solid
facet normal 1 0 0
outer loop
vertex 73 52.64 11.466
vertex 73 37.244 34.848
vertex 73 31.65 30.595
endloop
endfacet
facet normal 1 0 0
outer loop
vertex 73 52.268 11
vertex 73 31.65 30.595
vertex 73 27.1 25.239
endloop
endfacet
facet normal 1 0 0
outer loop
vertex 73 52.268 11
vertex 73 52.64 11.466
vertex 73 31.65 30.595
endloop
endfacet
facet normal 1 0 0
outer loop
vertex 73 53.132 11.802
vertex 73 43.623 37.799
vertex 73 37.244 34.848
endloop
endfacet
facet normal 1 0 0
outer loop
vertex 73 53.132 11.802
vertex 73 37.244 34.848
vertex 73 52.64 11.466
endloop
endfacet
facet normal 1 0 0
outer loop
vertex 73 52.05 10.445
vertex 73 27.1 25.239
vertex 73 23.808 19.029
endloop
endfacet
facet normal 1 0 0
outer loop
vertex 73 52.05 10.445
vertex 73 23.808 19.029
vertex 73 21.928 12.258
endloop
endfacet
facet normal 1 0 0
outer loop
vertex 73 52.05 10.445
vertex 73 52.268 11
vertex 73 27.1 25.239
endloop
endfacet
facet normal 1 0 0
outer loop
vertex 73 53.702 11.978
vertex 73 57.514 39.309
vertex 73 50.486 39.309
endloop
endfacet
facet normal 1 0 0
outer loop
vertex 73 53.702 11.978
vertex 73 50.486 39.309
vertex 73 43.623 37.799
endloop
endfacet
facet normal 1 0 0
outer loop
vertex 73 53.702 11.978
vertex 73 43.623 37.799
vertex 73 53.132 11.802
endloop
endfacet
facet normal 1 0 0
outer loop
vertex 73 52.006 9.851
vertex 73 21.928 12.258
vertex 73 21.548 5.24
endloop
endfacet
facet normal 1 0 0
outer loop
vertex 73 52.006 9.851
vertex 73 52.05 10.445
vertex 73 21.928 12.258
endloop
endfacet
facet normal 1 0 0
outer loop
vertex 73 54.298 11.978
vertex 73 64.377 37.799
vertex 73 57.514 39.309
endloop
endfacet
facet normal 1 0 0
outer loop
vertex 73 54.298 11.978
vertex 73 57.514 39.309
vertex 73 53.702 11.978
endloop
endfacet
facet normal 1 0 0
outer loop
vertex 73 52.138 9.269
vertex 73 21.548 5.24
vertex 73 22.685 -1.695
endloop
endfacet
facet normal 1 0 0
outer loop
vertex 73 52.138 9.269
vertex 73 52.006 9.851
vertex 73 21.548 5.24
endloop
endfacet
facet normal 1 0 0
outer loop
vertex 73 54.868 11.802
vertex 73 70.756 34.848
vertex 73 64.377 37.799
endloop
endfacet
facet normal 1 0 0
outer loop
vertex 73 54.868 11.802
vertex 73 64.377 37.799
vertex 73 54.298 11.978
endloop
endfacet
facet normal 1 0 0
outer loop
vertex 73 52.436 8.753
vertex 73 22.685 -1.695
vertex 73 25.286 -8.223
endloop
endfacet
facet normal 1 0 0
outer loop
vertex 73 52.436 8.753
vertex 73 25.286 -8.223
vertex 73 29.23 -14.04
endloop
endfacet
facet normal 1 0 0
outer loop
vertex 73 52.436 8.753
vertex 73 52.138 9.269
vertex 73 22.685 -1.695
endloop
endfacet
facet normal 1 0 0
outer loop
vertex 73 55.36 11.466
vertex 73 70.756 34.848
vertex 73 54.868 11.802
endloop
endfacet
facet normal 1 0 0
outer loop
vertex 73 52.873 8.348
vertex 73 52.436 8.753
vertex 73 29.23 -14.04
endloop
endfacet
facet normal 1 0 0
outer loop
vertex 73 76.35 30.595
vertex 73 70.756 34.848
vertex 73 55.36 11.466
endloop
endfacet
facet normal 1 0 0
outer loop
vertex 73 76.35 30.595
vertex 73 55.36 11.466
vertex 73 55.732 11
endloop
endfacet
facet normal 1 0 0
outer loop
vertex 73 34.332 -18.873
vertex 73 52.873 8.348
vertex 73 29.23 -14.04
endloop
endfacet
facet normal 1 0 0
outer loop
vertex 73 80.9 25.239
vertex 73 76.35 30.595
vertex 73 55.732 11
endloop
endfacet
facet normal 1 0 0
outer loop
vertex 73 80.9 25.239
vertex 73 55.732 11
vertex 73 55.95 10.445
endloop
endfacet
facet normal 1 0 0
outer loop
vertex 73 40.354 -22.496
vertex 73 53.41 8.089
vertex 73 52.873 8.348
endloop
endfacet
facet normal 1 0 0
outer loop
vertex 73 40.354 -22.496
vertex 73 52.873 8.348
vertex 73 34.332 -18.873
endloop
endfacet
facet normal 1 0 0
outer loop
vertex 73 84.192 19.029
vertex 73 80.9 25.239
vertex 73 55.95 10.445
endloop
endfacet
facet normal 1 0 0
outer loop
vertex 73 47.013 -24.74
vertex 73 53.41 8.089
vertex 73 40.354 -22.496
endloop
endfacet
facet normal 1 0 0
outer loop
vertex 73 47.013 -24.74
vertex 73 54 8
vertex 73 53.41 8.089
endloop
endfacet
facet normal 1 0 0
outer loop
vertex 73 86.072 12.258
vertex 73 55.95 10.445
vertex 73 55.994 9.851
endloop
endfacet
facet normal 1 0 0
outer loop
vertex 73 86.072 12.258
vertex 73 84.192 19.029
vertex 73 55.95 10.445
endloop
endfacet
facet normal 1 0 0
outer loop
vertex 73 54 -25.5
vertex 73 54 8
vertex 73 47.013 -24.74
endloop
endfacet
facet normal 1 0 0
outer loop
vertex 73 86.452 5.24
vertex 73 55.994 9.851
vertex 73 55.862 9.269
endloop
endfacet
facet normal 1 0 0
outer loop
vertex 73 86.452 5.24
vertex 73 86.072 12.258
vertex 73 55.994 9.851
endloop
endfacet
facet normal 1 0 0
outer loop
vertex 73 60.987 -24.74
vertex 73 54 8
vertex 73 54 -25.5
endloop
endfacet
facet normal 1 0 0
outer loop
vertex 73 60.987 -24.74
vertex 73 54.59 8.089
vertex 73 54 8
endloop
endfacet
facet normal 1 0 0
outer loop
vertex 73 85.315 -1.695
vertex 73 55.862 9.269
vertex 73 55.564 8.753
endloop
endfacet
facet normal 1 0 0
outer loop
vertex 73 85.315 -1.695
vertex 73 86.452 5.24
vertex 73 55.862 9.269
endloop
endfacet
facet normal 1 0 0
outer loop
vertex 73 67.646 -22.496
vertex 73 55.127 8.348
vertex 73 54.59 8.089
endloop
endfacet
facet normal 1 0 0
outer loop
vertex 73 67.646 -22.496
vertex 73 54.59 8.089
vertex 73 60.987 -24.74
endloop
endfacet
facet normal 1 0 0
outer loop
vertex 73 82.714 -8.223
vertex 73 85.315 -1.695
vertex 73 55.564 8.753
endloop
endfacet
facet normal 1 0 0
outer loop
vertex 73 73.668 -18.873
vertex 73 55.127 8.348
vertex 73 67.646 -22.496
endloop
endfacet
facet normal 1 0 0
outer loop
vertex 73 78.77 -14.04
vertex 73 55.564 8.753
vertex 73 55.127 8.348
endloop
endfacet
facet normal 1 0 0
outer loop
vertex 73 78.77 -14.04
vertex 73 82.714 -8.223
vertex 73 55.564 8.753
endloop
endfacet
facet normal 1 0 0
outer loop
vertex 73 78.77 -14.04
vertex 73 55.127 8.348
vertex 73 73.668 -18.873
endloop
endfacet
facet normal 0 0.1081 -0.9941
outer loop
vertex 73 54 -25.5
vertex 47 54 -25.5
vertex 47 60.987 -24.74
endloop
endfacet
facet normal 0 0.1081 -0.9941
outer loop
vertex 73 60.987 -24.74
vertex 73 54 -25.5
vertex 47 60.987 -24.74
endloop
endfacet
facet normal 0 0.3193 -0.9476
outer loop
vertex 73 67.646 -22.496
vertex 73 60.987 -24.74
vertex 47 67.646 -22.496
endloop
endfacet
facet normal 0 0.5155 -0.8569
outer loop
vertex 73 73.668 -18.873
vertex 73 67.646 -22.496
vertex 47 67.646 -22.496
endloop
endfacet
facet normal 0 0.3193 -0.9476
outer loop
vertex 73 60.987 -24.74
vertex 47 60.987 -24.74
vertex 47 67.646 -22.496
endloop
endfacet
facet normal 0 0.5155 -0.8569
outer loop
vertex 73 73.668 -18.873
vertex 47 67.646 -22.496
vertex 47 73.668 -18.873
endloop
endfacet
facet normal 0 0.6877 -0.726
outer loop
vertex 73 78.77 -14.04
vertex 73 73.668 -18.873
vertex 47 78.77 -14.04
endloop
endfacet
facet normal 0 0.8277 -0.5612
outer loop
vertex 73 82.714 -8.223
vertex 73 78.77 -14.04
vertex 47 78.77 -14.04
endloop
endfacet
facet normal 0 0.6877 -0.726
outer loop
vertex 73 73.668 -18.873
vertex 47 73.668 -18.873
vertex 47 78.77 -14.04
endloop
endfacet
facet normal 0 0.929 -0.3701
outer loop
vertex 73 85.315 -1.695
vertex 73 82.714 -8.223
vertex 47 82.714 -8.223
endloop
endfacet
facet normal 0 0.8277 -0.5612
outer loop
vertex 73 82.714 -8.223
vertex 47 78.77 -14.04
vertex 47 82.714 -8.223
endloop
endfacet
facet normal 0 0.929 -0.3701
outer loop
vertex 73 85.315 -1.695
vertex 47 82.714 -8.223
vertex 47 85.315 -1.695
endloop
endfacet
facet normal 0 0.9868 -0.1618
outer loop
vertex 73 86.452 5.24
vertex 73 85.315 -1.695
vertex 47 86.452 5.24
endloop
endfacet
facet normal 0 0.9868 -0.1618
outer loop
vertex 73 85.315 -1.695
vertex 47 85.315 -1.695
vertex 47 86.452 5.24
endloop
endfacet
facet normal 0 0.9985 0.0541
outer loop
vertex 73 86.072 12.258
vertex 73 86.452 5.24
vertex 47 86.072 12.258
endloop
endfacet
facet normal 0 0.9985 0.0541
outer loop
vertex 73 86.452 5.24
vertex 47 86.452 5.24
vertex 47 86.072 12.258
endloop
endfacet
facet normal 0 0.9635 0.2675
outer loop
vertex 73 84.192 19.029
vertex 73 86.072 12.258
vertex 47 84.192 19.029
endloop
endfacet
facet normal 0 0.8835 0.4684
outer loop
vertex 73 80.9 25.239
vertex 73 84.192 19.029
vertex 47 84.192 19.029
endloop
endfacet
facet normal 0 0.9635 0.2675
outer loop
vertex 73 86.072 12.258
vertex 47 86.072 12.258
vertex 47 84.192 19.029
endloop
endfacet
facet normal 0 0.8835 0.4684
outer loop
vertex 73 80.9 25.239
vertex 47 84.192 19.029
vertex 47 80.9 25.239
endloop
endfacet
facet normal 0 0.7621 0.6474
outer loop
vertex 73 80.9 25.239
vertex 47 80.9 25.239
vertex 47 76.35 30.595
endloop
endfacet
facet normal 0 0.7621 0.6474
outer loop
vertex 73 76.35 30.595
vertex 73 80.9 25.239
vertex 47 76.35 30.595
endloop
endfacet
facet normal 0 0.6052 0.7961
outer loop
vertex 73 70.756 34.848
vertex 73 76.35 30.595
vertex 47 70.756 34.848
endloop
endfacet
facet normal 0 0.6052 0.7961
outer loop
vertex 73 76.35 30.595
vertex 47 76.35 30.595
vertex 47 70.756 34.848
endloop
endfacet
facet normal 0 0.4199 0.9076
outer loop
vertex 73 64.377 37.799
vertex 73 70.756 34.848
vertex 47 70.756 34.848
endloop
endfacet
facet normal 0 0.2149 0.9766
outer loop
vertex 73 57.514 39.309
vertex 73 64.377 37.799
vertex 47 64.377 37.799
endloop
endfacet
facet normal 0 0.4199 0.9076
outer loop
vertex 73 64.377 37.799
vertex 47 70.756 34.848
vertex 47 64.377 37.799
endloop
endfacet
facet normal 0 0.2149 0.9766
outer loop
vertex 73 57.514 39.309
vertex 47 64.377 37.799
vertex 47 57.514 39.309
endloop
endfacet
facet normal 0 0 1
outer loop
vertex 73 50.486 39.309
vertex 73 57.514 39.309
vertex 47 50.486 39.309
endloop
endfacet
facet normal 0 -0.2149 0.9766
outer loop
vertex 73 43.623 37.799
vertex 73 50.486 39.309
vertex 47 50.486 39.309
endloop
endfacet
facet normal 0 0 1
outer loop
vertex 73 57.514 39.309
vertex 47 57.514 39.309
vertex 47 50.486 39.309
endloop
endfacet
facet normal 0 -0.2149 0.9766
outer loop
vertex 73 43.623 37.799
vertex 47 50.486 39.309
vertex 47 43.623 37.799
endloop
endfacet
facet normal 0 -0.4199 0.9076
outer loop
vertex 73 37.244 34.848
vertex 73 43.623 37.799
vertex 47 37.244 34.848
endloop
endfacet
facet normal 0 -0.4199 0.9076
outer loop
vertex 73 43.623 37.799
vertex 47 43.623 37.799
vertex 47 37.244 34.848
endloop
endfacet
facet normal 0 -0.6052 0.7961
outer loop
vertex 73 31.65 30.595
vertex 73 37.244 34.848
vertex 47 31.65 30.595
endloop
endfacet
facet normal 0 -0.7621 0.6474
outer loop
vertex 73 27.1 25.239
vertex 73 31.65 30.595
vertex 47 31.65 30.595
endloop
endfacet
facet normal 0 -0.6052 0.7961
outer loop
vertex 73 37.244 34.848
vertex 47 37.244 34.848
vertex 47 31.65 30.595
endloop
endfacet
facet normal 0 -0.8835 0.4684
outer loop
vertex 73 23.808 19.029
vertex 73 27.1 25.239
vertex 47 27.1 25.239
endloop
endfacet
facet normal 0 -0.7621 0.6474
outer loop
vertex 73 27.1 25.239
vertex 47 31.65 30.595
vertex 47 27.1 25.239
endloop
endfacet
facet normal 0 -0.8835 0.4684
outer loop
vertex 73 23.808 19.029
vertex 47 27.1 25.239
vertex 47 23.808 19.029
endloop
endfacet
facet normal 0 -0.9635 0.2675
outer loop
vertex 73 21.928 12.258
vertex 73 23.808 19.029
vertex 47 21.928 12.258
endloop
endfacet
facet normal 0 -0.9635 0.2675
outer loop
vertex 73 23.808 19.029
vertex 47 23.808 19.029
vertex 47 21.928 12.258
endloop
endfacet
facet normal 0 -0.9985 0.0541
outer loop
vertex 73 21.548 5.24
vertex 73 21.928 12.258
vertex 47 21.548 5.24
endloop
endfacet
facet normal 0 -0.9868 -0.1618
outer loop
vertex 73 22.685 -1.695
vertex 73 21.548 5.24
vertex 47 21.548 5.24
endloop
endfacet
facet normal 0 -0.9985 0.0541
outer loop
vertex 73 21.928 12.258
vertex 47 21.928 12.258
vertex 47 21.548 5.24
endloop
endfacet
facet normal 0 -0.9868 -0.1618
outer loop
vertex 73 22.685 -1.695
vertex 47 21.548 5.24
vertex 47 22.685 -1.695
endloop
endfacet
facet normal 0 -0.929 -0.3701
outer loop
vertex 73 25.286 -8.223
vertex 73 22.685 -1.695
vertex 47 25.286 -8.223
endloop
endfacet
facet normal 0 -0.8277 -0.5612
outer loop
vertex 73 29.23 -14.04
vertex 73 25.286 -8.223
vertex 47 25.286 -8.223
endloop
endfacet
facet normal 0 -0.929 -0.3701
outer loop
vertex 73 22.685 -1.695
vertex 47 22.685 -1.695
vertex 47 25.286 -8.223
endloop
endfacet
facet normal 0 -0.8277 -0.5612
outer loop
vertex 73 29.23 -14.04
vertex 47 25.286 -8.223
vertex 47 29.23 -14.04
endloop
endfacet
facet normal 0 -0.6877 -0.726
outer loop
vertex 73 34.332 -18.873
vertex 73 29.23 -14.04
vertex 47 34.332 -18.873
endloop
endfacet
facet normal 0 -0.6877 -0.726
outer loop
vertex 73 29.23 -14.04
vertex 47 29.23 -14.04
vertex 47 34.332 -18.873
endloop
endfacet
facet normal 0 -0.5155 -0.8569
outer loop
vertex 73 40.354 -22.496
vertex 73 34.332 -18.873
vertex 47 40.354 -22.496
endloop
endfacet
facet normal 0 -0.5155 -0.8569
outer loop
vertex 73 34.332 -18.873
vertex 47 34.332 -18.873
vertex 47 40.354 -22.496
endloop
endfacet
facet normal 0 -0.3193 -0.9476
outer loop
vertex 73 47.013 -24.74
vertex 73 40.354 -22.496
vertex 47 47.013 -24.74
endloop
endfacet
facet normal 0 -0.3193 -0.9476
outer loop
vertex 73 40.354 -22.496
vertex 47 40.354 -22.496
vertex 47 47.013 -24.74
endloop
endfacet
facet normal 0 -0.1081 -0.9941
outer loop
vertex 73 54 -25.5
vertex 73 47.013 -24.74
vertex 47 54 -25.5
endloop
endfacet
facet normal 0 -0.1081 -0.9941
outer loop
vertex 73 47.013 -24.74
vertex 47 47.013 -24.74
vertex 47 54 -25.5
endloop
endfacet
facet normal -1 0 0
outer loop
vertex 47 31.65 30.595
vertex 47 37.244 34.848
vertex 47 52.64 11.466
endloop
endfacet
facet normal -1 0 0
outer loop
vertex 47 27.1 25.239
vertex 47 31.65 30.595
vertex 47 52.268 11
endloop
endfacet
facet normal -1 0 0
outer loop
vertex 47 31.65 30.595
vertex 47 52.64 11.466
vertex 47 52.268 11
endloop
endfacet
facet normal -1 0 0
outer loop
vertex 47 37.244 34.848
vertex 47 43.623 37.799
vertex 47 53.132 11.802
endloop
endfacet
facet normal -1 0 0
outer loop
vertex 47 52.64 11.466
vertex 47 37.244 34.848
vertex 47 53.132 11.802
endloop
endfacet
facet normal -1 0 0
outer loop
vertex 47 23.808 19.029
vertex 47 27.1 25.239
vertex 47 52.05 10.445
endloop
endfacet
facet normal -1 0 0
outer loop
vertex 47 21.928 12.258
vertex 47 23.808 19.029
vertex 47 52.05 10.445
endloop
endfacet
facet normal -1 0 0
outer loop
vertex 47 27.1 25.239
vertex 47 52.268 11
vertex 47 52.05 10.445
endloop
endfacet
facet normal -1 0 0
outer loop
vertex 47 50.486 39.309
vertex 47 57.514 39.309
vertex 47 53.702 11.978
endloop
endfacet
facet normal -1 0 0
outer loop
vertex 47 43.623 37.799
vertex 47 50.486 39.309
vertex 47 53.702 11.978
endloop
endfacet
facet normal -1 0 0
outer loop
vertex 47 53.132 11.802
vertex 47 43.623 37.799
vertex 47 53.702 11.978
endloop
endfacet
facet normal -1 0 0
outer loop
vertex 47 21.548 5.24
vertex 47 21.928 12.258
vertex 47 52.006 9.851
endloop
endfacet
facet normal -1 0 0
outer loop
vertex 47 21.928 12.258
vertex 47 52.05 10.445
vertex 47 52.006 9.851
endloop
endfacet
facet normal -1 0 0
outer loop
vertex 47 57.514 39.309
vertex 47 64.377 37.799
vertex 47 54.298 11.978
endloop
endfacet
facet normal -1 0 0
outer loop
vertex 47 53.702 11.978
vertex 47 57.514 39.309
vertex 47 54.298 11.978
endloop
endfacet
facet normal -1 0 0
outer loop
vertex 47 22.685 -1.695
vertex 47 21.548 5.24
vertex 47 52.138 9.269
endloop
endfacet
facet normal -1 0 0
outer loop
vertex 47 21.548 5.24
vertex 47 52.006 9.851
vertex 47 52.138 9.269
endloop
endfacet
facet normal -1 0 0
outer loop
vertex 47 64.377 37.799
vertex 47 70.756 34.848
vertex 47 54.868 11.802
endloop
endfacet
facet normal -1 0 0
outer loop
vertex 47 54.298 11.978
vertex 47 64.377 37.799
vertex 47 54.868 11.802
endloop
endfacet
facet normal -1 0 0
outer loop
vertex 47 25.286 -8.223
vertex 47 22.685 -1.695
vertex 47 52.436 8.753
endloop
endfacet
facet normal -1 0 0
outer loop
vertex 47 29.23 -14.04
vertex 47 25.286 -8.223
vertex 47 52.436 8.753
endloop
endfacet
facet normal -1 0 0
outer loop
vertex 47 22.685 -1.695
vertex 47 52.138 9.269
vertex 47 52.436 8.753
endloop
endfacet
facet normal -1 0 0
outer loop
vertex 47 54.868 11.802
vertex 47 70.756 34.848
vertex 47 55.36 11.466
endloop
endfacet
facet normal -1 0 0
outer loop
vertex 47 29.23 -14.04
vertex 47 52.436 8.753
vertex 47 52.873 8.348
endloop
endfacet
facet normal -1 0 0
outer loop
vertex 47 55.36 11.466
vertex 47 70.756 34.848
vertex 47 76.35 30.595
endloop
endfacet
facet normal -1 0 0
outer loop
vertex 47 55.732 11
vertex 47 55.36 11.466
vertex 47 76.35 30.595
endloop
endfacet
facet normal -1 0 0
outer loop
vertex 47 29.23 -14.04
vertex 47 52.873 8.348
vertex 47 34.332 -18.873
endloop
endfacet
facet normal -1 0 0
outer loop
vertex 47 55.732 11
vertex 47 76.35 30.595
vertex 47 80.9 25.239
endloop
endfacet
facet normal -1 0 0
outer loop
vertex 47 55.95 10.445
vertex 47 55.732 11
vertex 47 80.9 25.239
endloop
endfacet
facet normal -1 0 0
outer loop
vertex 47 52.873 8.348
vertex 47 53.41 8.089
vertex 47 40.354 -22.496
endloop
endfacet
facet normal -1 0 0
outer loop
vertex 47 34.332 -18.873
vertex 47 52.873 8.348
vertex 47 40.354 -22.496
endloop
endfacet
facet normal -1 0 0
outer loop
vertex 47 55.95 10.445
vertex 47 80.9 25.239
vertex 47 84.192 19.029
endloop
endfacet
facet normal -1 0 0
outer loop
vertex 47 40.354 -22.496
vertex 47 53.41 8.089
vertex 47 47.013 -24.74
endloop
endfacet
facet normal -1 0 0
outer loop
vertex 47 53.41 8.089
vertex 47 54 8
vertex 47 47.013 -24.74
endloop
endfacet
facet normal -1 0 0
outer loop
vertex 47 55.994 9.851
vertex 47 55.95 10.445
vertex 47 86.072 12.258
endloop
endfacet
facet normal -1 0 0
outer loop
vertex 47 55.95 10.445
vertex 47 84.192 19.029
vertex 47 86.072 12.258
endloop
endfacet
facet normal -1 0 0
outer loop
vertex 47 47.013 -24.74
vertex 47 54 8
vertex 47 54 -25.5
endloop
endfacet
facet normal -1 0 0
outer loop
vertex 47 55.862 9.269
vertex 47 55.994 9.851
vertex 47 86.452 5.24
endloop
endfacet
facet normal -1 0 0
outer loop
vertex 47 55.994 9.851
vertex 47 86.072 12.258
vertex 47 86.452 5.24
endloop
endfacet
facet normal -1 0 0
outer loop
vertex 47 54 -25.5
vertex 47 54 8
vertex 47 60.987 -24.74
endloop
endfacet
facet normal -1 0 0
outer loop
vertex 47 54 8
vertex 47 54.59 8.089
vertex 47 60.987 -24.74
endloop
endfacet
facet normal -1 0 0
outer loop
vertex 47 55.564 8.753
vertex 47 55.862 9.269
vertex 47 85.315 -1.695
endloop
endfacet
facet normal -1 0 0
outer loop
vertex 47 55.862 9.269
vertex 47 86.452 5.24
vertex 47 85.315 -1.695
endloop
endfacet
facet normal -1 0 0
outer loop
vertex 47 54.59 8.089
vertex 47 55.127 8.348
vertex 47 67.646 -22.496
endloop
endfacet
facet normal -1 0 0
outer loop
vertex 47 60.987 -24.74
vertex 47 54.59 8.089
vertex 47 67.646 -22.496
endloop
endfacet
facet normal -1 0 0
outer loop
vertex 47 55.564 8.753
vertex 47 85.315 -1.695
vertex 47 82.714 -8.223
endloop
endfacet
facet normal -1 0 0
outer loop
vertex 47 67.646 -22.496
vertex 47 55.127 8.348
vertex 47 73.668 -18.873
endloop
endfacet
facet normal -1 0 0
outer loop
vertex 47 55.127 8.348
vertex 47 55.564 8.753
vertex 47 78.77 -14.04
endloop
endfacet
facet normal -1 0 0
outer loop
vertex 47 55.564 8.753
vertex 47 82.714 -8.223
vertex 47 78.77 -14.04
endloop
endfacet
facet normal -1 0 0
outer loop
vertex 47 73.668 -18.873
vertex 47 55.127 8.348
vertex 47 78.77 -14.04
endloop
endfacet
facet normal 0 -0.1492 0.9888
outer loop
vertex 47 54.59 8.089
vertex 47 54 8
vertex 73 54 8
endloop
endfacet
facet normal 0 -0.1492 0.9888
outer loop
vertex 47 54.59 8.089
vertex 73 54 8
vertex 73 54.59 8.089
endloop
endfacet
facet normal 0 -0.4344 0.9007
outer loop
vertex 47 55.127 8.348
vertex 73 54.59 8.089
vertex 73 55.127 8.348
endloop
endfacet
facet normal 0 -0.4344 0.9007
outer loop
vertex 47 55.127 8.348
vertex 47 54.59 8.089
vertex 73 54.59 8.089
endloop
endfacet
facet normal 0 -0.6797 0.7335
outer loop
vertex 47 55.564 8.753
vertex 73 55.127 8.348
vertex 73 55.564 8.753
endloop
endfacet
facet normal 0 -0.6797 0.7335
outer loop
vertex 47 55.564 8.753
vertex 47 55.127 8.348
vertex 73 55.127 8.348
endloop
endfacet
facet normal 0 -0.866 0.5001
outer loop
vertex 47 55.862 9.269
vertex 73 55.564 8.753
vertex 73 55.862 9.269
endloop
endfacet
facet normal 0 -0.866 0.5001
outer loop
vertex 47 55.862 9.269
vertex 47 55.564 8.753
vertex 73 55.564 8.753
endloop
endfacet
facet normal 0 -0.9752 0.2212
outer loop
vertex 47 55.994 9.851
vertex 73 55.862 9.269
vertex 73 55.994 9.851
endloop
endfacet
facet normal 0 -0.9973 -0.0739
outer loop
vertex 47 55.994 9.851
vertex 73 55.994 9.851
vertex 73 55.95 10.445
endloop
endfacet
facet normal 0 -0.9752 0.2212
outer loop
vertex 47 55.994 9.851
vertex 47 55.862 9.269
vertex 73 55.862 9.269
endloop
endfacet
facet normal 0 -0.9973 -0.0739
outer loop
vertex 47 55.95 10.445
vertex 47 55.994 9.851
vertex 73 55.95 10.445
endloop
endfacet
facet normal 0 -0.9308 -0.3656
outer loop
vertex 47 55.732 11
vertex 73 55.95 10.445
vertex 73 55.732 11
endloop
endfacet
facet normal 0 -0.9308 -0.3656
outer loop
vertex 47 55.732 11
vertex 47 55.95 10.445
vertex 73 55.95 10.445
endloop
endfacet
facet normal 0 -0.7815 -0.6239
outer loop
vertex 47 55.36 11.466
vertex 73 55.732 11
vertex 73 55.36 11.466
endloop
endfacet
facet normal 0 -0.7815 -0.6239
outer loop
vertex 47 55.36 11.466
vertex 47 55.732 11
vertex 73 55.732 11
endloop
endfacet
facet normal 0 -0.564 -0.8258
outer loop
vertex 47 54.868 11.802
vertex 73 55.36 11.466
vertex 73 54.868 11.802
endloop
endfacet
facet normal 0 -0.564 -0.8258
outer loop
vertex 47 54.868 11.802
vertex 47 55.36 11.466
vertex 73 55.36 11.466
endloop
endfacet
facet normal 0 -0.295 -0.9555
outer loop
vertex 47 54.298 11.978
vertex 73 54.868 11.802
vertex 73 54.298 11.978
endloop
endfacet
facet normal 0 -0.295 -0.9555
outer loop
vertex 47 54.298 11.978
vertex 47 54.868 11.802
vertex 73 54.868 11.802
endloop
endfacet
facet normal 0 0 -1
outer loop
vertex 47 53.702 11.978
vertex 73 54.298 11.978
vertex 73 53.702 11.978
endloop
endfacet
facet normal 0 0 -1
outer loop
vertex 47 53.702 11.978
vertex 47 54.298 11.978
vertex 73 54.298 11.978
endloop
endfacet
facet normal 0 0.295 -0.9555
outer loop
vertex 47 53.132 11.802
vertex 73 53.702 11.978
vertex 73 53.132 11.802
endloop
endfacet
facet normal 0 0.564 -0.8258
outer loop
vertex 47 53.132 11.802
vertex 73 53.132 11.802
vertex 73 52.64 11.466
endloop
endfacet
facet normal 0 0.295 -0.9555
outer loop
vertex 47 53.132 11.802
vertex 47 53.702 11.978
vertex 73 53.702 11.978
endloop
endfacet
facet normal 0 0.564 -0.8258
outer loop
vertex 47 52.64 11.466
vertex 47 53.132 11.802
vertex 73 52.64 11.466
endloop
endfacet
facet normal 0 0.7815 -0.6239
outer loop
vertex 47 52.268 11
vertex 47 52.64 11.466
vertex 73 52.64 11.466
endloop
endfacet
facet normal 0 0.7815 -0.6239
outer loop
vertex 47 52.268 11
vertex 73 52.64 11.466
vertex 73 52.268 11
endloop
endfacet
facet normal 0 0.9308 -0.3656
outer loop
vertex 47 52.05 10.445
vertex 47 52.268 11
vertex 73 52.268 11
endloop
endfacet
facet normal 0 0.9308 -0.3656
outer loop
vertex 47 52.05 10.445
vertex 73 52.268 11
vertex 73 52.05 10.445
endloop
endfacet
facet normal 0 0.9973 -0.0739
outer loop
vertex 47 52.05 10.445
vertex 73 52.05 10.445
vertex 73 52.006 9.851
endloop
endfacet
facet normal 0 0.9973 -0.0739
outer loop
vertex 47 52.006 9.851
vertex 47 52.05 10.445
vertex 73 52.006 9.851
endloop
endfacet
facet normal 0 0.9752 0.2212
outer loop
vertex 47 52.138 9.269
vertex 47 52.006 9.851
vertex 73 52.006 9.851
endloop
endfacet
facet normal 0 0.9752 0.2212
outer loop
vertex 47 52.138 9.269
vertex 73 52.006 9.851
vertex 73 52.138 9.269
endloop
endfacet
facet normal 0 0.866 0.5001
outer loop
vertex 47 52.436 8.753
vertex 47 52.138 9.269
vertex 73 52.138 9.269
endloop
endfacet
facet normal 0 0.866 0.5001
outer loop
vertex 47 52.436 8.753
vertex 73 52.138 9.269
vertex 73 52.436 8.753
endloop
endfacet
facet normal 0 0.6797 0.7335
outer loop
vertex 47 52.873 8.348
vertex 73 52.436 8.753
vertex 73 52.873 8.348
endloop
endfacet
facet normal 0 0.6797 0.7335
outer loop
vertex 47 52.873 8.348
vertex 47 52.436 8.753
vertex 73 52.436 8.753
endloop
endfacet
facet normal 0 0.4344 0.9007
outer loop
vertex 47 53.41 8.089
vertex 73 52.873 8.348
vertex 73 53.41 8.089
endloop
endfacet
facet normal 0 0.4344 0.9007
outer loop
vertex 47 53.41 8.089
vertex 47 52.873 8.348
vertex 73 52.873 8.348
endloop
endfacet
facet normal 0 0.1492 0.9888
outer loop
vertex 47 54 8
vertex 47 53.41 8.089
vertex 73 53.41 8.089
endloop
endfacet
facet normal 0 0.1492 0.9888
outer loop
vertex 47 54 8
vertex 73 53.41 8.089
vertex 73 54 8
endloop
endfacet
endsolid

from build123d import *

# Parameters (mm, degrees)
CYLINDER268_R          = 2
CYLINDER268_DEPTH      = 26
CYLINDER267_R          = 32.5
CYLINDER267_DEPTH      = 26
CUT248_PLACEMENT_ANGLE = 90


with BuildPart() as cylinder268:
    # Cylinder268 → Cylinder268 (new body)
    with BuildSketch(Plane.XY):
        Circle(CYLINDER268_R)
    extrude(amount=CYLINDER268_DEPTH)


with BuildPart() as cut248:
    # Cylinder267 → Cylinder267 (new body)
    with BuildSketch(Plane(origin=(3, 0, 0), x_dir=(1, 0, 0), z_dir=(0, 0, 1))):
        Circle(CYLINDER267_R)
    extrude(amount=CYLINDER267_DEPTH)

    # Cut248: cut Cylinder268
    add(cylinder268.part, mode=Mode.SUBTRACT)


with BuildPart() as cut248_1:
    # Cut248 placement: moved
    add(cut248.part.moved(Location((47, 54, 10))).rotate(Axis((47, 54, 10), (0, 1, 0)), CUT248_PLACEMENT_ANGLE))


solid = cut248_1.part
